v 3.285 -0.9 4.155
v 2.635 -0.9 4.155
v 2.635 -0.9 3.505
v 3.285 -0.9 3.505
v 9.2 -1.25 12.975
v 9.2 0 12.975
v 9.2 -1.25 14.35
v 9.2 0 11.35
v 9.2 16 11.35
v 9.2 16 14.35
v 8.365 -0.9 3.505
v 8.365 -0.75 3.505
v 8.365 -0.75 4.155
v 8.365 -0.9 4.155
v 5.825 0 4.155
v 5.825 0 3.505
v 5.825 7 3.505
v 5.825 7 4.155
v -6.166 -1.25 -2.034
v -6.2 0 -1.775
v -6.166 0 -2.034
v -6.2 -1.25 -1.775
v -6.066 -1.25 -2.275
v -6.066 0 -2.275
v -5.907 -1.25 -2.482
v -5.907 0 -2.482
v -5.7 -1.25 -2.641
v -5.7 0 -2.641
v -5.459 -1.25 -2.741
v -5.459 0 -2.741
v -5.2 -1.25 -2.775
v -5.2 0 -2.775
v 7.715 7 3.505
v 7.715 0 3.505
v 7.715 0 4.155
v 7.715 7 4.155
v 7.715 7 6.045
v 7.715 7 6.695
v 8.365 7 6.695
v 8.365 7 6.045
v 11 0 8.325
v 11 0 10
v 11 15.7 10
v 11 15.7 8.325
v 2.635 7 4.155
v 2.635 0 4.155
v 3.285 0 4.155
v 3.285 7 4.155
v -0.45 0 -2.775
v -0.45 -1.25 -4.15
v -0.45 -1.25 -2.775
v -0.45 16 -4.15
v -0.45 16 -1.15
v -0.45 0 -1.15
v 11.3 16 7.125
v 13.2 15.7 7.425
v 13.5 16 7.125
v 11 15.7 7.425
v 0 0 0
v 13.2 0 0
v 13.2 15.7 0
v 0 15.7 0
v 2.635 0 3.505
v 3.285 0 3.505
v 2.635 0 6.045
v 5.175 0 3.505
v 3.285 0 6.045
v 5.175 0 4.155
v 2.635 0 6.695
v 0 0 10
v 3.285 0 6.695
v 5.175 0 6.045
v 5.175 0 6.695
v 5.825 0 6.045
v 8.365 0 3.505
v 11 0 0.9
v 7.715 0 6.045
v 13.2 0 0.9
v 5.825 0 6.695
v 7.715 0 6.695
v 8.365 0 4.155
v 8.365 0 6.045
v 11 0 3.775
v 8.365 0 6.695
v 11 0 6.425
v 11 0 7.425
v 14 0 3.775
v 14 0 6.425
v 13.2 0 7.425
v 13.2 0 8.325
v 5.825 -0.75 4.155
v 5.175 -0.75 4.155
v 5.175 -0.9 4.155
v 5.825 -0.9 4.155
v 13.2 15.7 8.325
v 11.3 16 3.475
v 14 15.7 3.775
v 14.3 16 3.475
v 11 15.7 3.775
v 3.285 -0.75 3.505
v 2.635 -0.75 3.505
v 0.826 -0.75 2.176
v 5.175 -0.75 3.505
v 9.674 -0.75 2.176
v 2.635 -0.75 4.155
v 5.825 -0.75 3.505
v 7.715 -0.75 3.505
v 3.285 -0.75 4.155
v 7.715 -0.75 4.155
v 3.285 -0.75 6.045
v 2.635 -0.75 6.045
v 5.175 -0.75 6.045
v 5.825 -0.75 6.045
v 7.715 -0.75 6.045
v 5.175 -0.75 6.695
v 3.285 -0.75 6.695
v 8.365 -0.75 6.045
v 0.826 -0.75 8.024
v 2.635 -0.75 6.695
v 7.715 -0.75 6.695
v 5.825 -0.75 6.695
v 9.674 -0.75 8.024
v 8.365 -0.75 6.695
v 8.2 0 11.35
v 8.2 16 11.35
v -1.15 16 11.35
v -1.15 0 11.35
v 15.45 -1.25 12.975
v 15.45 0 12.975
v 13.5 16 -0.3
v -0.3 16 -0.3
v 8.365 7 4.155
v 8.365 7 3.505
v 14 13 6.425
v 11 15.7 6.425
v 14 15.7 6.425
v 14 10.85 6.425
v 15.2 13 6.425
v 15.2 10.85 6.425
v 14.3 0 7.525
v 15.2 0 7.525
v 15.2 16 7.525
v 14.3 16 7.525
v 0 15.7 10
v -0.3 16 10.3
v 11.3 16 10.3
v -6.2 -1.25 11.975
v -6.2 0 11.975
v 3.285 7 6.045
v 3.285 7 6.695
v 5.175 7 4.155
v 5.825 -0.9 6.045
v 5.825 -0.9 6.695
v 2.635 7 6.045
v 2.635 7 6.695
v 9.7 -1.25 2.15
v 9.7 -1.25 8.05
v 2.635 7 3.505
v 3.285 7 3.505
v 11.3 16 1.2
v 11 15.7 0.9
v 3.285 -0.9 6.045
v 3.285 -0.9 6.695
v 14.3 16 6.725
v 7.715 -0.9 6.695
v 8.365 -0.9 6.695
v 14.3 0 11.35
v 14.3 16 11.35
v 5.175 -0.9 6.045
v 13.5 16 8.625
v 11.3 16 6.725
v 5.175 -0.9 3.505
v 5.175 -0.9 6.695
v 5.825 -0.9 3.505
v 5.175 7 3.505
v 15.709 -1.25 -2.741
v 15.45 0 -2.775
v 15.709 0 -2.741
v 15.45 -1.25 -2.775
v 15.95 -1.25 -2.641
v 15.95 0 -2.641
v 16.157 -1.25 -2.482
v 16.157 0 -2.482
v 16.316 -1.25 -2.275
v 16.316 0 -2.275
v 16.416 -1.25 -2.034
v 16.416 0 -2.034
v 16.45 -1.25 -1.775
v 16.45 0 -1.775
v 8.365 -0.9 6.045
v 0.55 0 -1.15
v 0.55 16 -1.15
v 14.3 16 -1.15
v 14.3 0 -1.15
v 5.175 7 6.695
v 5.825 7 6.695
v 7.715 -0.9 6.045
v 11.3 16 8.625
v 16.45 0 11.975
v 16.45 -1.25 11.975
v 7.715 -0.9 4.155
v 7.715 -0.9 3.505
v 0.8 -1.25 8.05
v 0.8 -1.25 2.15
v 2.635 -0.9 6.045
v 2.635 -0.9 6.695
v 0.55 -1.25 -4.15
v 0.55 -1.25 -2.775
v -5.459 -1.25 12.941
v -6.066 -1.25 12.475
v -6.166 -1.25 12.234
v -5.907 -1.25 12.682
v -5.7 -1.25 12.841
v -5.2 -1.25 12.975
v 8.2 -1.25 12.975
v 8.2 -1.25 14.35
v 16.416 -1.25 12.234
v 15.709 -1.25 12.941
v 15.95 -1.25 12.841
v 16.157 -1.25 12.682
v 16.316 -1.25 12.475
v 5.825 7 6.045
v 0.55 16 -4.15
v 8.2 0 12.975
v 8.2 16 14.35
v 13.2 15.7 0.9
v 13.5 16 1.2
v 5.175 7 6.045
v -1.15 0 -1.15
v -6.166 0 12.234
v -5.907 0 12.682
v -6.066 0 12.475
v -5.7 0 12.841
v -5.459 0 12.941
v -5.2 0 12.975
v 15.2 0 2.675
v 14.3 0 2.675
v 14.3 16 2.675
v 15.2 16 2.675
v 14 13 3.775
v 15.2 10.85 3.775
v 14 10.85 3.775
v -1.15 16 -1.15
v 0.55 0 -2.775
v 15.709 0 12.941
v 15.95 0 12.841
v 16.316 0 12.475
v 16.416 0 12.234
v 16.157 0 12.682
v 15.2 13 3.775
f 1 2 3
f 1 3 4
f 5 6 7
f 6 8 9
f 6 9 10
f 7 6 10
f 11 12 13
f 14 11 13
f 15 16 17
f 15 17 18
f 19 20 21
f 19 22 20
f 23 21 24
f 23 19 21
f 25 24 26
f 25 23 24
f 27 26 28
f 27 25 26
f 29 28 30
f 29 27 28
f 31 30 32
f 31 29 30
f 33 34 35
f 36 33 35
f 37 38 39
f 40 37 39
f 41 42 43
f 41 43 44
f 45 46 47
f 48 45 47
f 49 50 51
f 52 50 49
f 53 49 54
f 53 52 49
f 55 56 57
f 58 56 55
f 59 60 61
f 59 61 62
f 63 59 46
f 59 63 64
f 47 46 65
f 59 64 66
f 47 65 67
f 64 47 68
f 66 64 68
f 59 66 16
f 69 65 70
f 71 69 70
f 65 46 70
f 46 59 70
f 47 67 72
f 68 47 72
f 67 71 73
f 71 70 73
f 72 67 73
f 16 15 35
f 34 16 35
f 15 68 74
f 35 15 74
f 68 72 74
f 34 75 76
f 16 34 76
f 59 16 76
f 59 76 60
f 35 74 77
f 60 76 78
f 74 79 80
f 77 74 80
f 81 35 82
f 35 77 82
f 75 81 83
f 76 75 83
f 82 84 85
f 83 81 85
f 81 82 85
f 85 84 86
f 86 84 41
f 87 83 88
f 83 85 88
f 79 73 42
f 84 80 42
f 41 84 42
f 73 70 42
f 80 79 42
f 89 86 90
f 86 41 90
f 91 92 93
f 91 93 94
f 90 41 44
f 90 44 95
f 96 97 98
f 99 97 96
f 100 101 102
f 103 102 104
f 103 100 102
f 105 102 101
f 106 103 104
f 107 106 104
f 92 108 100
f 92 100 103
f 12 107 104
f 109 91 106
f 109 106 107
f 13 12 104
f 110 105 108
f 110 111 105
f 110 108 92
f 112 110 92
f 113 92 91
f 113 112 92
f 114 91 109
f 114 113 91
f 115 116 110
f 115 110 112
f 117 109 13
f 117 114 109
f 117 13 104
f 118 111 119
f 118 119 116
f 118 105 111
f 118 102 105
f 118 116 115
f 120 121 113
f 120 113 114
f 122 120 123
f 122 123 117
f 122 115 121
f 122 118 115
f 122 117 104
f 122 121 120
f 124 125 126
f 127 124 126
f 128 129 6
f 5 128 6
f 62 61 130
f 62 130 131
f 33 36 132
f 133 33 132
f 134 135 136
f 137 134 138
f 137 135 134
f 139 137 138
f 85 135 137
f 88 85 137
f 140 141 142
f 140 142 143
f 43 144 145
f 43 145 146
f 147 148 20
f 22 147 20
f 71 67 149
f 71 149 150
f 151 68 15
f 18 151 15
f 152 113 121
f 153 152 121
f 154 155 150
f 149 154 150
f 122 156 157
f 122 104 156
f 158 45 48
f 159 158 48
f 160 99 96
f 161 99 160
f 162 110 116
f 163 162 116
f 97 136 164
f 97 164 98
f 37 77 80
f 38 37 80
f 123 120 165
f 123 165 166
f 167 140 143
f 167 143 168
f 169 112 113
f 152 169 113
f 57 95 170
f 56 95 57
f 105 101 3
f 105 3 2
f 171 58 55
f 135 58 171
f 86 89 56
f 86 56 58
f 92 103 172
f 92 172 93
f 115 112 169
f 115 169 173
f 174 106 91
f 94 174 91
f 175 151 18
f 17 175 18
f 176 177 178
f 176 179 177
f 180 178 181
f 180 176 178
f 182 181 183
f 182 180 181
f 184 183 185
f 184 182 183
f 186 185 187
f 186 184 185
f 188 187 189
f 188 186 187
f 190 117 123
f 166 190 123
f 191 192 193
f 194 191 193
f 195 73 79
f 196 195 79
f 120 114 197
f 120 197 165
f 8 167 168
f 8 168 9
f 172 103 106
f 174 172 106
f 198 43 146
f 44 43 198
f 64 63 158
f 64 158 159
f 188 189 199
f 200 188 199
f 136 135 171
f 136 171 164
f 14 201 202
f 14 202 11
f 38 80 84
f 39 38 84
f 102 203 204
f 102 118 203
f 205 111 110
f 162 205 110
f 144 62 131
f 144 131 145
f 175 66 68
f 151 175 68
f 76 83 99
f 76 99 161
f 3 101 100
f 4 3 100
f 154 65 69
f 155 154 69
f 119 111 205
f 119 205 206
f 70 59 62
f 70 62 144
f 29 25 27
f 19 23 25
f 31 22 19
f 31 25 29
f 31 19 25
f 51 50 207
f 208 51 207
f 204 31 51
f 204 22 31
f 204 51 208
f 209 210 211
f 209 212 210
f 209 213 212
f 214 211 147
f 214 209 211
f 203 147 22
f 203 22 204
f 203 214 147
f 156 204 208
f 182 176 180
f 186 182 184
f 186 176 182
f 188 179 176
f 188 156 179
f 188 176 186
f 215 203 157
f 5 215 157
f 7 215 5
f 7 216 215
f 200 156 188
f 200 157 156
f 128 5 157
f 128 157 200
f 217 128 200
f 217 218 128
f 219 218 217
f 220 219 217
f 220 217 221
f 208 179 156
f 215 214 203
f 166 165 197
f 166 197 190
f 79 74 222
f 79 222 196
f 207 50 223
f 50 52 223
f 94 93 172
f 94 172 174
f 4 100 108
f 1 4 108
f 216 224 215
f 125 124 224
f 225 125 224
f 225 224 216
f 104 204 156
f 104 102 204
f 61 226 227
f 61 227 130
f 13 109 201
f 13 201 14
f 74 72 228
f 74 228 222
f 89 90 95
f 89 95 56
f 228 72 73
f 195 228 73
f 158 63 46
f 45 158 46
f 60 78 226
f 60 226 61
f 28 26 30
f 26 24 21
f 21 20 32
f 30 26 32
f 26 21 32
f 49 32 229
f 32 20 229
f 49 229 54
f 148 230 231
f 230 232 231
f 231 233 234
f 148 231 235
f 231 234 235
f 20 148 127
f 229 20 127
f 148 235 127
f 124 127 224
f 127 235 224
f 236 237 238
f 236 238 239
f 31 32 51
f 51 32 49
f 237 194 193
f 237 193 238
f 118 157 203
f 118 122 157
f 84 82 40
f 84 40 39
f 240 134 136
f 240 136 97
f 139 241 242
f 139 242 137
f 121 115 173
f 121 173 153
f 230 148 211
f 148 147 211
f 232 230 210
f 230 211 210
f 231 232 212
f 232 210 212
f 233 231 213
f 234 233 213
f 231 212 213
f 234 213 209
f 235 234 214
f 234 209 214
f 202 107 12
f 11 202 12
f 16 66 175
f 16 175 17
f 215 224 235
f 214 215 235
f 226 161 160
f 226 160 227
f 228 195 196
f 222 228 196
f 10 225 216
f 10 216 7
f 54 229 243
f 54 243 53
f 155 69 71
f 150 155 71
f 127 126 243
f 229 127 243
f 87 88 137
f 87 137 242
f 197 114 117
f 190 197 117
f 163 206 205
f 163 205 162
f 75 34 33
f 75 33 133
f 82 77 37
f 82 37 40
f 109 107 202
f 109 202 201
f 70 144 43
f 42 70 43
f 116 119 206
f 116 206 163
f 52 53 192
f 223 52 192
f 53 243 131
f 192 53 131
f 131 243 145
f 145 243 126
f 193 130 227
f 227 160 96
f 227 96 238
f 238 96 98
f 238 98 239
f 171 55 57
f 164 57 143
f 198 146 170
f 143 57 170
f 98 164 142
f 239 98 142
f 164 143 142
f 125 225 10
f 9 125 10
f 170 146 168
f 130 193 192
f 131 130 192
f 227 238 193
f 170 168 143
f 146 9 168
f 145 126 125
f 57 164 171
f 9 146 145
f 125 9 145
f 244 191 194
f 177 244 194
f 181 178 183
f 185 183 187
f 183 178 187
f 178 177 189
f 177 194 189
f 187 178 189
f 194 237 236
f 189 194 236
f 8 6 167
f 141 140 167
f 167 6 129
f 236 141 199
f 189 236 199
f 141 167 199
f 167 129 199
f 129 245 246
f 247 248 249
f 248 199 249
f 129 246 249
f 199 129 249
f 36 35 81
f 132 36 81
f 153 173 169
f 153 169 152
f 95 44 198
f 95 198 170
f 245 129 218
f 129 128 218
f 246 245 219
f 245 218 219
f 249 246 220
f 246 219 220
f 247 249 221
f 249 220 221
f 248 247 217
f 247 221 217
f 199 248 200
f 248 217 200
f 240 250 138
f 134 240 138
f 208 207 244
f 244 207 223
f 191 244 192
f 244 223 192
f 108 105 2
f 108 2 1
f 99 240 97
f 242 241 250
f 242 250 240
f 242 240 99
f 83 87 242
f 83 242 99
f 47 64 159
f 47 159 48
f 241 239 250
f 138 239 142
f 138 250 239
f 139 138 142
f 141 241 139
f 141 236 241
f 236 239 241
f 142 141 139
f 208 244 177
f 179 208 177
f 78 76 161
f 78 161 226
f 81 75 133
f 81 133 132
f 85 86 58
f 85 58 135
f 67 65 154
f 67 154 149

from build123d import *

# Parameters (mm, degrees)
F0_W          = 1
F0_H          = 1.375
F1_DEPTH      = 16
F0_W_2        = 0.65
F0_H_2        = 0.65
F2_DEPTH      = 1.25
F3_W          = 2.15
F3_H          = 2.65
F4_DEPTH      = 1.2
F5_R          = 1
F6_W          = 8.9
F6_H          = 5.9
F7_DEPTH      = 0.5
F7_TAPER      = 3
F8_DEPTH      = 7
F8_DEPTH_BACK = 0.9
F9_SIZE       = 0.3


# Not quite as in the source:
# - a feature names something its author has since deleted; it is built from what else it names


with BuildPart() as f1:
    # F0 (on Front) → F1 (new body)
    with BuildSketch(Plane.XZ):
        Polygon((-1.15, 11.35), (-1.15, -1.15), (-0.45, -1.15), (-0.45, -2.775), (0.55, -2.775), (0.55, -1.15), (14.3, -1.15), (14.3, 2.675), (15.2, 2.675), (15.2, 7.525), (14.3, 7.525), (14.3, 11.35), (9.2, 11.35), (9.2, 12.975), (8.2, 12.975), (8.2, 11.35), align=None)
        Polygon((13.2, 0), (0, 0), (0, 10), (11, 10), (11, 8.325), (13.2, 8.325), (13.2, 7.425), (11, 7.425), (11, 6.425), (14, 6.425), (14, 3.775), (11, 3.775), (11, 0.9), (13.2, 0.9), align=None, mode=Mode.SUBTRACT)
        with Locations((8.7, 13.6625)):
            Rectangle(F0_W, F0_H)
        with Locations((0.05, -3.4625)):
            Rectangle(F0_W, F0_H)
    extrude(amount=-F1_DEPTH)

    # F0 (on Front) → F2 (join)
    with BuildSketch(Plane.XZ):
        Polygon((-1.15, 11.35), (-1.15, -1.15), (-0.45, -1.15), (-0.45, -2.775), (0.55, -2.775), (0.55, -1.15), (14.3, -1.15), (14.3, 2.675), (15.2, 2.675), (15.2, 7.525), (14.3, 7.525), (14.3, 11.35), (9.2, 11.35), (9.2, 12.975), (8.2, 12.975), (8.2, 11.35), align=None)
        Polygon((13.2, 0), (0, 0), (0, 10), (11, 10), (11, 8.325), (13.2, 8.325), (13.2, 7.425), (11, 7.425), (11, 6.425), (14, 6.425), (14, 3.775), (11, 3.775), (11, 0.9), (13.2, 0.9), align=None, mode=Mode.SUBTRACT)
        Polygon((-0.45, -1.15), (-1.15, -1.15), (-1.15, 11.35), (8.2, 11.35), (8.2, 12.975), (-6.2, 12.975), (-6.2, -2.775), (-0.45, -2.775), align=None)
        with Locations((0.05, -3.4625)):
            Rectangle(F0_W, F0_H)
        Polygon((0.55, -1.15), (0.55, -2.775), (16.45, -2.775), (16.45, 12.975), (9.2, 12.975), (9.2, 11.35), (14.3, 11.35), (14.3, 7.525), (15.2, 7.525), (15.2, 2.675), (14.3, 2.675), (14.3, -1.15), align=None)
        with Locations((8.7, 13.6625)):
            Rectangle(F0_W, F0_H)
        Polygon((0, 10), (0, 0), (13.2, 0), (13.2, 0.9), (11, 0.9), (11, 3.775), (14, 3.775), (14, 6.425), (11, 6.425), (11, 7.425), (13.2, 7.425), (13.2, 8.325), (11, 8.325), (11, 10), align=None)
        with Locations((2.96, 3.83)):
            Rectangle(F0_W_2, F0_H_2, mode=Mode.SUBTRACT)
        with Locations((5.5, 3.83)):
            Rectangle(F0_W_2, F0_H_2, mode=Mode.SUBTRACT)
        with Locations((8.04, 3.83)):
            Rectangle(F0_W_2, F0_H_2, mode=Mode.SUBTRACT)
        with Locations((2.96, 6.37)):
            Rectangle(F0_W_2, F0_H_2, mode=Mode.SUBTRACT)
        with Locations((5.5, 6.37)):
            Rectangle(F0_W_2, F0_H_2, mode=Mode.SUBTRACT)
        with Locations((8.04, 6.37)):
            Rectangle(F0_W_2, F0_H_2, mode=Mode.SUBTRACT)
    extrude(amount=F2_DEPTH)

    # F3 (on face) → F4 (cut, through all)
    with BuildSketch(Plane.YZ.offset(15.2)):
        with Locations((11.925, 5.1)):
            Rectangle(F3_W, F3_H)
    extrude(amount=-F4_DEPTH, mode=Mode.SUBTRACT)

    # F5
    f5_edges = [f1.edges().sort_by_distance(p)[0] for p in [
        (16.45, -0.625, 12.975),
        (-6.2, -0.625, 12.975),
        (16.45, -0.625, -2.775),
        (-6.2, -0.625, -2.775),
    ]]
    fillet(f5_edges, radius=F5_R)

    # F6 (on face) → F7 (cut)
    with BuildSketch(Plane.XZ.offset(1.25)):
        with Locations((5.25, 5.1)):
            Rectangle(F6_W, F6_H)
    extrude(amount=-F7_DEPTH, taper=F7_TAPER, mode=Mode.SUBTRACT)

    # F0 (on Front) → F8 (join, two sides)
    with BuildSketch(Plane.XZ) as f8_sk:
        with Locations((2.96, 6.37)):
            Rectangle(F0_W_2, F0_H_2)
        with Locations((5.5, 6.37)):
            Rectangle(F0_W_2, F0_H_2)
        with Locations((8.04, 6.37)):
            Rectangle(F0_W_2, F0_H_2)
        with Locations((2.96, 3.83)):
            Rectangle(F0_W_2, F0_H_2)
        with Locations((5.5, 3.83)):
            Rectangle(F0_W_2, F0_H_2)
        with Locations((8.04, 3.83)):
            Rectangle(F0_W_2, F0_H_2)
    extrude(amount=-F8_DEPTH)
    extrude(f8_sk.sketch, amount=F8_DEPTH_BACK)

    # F9
    f9_edges = [f1.edges().sort_by_distance(p)[0] for p in [
        (12.1, 16, 7.425),
        (13.2, 16, 7.875),
        (5.5, 16, 10),
        (0, 16, 5),
        (6.6, 16, 0),
        (12.1, 16, 0.9),
        (13.2, 16, 0.45),
        (11, 16, 2.3375),
        (12.5, 16, 3.775),
        (14, 16, 5.1),
        (12.5, 16, 6.425),
        (11, 16, 6.925),
        (12.1, 16, 8.325),
        (11, 16, 9.1625),
    ]]
    chamfer(f9_edges, length=F9_SIZE)


solid = f1.part
